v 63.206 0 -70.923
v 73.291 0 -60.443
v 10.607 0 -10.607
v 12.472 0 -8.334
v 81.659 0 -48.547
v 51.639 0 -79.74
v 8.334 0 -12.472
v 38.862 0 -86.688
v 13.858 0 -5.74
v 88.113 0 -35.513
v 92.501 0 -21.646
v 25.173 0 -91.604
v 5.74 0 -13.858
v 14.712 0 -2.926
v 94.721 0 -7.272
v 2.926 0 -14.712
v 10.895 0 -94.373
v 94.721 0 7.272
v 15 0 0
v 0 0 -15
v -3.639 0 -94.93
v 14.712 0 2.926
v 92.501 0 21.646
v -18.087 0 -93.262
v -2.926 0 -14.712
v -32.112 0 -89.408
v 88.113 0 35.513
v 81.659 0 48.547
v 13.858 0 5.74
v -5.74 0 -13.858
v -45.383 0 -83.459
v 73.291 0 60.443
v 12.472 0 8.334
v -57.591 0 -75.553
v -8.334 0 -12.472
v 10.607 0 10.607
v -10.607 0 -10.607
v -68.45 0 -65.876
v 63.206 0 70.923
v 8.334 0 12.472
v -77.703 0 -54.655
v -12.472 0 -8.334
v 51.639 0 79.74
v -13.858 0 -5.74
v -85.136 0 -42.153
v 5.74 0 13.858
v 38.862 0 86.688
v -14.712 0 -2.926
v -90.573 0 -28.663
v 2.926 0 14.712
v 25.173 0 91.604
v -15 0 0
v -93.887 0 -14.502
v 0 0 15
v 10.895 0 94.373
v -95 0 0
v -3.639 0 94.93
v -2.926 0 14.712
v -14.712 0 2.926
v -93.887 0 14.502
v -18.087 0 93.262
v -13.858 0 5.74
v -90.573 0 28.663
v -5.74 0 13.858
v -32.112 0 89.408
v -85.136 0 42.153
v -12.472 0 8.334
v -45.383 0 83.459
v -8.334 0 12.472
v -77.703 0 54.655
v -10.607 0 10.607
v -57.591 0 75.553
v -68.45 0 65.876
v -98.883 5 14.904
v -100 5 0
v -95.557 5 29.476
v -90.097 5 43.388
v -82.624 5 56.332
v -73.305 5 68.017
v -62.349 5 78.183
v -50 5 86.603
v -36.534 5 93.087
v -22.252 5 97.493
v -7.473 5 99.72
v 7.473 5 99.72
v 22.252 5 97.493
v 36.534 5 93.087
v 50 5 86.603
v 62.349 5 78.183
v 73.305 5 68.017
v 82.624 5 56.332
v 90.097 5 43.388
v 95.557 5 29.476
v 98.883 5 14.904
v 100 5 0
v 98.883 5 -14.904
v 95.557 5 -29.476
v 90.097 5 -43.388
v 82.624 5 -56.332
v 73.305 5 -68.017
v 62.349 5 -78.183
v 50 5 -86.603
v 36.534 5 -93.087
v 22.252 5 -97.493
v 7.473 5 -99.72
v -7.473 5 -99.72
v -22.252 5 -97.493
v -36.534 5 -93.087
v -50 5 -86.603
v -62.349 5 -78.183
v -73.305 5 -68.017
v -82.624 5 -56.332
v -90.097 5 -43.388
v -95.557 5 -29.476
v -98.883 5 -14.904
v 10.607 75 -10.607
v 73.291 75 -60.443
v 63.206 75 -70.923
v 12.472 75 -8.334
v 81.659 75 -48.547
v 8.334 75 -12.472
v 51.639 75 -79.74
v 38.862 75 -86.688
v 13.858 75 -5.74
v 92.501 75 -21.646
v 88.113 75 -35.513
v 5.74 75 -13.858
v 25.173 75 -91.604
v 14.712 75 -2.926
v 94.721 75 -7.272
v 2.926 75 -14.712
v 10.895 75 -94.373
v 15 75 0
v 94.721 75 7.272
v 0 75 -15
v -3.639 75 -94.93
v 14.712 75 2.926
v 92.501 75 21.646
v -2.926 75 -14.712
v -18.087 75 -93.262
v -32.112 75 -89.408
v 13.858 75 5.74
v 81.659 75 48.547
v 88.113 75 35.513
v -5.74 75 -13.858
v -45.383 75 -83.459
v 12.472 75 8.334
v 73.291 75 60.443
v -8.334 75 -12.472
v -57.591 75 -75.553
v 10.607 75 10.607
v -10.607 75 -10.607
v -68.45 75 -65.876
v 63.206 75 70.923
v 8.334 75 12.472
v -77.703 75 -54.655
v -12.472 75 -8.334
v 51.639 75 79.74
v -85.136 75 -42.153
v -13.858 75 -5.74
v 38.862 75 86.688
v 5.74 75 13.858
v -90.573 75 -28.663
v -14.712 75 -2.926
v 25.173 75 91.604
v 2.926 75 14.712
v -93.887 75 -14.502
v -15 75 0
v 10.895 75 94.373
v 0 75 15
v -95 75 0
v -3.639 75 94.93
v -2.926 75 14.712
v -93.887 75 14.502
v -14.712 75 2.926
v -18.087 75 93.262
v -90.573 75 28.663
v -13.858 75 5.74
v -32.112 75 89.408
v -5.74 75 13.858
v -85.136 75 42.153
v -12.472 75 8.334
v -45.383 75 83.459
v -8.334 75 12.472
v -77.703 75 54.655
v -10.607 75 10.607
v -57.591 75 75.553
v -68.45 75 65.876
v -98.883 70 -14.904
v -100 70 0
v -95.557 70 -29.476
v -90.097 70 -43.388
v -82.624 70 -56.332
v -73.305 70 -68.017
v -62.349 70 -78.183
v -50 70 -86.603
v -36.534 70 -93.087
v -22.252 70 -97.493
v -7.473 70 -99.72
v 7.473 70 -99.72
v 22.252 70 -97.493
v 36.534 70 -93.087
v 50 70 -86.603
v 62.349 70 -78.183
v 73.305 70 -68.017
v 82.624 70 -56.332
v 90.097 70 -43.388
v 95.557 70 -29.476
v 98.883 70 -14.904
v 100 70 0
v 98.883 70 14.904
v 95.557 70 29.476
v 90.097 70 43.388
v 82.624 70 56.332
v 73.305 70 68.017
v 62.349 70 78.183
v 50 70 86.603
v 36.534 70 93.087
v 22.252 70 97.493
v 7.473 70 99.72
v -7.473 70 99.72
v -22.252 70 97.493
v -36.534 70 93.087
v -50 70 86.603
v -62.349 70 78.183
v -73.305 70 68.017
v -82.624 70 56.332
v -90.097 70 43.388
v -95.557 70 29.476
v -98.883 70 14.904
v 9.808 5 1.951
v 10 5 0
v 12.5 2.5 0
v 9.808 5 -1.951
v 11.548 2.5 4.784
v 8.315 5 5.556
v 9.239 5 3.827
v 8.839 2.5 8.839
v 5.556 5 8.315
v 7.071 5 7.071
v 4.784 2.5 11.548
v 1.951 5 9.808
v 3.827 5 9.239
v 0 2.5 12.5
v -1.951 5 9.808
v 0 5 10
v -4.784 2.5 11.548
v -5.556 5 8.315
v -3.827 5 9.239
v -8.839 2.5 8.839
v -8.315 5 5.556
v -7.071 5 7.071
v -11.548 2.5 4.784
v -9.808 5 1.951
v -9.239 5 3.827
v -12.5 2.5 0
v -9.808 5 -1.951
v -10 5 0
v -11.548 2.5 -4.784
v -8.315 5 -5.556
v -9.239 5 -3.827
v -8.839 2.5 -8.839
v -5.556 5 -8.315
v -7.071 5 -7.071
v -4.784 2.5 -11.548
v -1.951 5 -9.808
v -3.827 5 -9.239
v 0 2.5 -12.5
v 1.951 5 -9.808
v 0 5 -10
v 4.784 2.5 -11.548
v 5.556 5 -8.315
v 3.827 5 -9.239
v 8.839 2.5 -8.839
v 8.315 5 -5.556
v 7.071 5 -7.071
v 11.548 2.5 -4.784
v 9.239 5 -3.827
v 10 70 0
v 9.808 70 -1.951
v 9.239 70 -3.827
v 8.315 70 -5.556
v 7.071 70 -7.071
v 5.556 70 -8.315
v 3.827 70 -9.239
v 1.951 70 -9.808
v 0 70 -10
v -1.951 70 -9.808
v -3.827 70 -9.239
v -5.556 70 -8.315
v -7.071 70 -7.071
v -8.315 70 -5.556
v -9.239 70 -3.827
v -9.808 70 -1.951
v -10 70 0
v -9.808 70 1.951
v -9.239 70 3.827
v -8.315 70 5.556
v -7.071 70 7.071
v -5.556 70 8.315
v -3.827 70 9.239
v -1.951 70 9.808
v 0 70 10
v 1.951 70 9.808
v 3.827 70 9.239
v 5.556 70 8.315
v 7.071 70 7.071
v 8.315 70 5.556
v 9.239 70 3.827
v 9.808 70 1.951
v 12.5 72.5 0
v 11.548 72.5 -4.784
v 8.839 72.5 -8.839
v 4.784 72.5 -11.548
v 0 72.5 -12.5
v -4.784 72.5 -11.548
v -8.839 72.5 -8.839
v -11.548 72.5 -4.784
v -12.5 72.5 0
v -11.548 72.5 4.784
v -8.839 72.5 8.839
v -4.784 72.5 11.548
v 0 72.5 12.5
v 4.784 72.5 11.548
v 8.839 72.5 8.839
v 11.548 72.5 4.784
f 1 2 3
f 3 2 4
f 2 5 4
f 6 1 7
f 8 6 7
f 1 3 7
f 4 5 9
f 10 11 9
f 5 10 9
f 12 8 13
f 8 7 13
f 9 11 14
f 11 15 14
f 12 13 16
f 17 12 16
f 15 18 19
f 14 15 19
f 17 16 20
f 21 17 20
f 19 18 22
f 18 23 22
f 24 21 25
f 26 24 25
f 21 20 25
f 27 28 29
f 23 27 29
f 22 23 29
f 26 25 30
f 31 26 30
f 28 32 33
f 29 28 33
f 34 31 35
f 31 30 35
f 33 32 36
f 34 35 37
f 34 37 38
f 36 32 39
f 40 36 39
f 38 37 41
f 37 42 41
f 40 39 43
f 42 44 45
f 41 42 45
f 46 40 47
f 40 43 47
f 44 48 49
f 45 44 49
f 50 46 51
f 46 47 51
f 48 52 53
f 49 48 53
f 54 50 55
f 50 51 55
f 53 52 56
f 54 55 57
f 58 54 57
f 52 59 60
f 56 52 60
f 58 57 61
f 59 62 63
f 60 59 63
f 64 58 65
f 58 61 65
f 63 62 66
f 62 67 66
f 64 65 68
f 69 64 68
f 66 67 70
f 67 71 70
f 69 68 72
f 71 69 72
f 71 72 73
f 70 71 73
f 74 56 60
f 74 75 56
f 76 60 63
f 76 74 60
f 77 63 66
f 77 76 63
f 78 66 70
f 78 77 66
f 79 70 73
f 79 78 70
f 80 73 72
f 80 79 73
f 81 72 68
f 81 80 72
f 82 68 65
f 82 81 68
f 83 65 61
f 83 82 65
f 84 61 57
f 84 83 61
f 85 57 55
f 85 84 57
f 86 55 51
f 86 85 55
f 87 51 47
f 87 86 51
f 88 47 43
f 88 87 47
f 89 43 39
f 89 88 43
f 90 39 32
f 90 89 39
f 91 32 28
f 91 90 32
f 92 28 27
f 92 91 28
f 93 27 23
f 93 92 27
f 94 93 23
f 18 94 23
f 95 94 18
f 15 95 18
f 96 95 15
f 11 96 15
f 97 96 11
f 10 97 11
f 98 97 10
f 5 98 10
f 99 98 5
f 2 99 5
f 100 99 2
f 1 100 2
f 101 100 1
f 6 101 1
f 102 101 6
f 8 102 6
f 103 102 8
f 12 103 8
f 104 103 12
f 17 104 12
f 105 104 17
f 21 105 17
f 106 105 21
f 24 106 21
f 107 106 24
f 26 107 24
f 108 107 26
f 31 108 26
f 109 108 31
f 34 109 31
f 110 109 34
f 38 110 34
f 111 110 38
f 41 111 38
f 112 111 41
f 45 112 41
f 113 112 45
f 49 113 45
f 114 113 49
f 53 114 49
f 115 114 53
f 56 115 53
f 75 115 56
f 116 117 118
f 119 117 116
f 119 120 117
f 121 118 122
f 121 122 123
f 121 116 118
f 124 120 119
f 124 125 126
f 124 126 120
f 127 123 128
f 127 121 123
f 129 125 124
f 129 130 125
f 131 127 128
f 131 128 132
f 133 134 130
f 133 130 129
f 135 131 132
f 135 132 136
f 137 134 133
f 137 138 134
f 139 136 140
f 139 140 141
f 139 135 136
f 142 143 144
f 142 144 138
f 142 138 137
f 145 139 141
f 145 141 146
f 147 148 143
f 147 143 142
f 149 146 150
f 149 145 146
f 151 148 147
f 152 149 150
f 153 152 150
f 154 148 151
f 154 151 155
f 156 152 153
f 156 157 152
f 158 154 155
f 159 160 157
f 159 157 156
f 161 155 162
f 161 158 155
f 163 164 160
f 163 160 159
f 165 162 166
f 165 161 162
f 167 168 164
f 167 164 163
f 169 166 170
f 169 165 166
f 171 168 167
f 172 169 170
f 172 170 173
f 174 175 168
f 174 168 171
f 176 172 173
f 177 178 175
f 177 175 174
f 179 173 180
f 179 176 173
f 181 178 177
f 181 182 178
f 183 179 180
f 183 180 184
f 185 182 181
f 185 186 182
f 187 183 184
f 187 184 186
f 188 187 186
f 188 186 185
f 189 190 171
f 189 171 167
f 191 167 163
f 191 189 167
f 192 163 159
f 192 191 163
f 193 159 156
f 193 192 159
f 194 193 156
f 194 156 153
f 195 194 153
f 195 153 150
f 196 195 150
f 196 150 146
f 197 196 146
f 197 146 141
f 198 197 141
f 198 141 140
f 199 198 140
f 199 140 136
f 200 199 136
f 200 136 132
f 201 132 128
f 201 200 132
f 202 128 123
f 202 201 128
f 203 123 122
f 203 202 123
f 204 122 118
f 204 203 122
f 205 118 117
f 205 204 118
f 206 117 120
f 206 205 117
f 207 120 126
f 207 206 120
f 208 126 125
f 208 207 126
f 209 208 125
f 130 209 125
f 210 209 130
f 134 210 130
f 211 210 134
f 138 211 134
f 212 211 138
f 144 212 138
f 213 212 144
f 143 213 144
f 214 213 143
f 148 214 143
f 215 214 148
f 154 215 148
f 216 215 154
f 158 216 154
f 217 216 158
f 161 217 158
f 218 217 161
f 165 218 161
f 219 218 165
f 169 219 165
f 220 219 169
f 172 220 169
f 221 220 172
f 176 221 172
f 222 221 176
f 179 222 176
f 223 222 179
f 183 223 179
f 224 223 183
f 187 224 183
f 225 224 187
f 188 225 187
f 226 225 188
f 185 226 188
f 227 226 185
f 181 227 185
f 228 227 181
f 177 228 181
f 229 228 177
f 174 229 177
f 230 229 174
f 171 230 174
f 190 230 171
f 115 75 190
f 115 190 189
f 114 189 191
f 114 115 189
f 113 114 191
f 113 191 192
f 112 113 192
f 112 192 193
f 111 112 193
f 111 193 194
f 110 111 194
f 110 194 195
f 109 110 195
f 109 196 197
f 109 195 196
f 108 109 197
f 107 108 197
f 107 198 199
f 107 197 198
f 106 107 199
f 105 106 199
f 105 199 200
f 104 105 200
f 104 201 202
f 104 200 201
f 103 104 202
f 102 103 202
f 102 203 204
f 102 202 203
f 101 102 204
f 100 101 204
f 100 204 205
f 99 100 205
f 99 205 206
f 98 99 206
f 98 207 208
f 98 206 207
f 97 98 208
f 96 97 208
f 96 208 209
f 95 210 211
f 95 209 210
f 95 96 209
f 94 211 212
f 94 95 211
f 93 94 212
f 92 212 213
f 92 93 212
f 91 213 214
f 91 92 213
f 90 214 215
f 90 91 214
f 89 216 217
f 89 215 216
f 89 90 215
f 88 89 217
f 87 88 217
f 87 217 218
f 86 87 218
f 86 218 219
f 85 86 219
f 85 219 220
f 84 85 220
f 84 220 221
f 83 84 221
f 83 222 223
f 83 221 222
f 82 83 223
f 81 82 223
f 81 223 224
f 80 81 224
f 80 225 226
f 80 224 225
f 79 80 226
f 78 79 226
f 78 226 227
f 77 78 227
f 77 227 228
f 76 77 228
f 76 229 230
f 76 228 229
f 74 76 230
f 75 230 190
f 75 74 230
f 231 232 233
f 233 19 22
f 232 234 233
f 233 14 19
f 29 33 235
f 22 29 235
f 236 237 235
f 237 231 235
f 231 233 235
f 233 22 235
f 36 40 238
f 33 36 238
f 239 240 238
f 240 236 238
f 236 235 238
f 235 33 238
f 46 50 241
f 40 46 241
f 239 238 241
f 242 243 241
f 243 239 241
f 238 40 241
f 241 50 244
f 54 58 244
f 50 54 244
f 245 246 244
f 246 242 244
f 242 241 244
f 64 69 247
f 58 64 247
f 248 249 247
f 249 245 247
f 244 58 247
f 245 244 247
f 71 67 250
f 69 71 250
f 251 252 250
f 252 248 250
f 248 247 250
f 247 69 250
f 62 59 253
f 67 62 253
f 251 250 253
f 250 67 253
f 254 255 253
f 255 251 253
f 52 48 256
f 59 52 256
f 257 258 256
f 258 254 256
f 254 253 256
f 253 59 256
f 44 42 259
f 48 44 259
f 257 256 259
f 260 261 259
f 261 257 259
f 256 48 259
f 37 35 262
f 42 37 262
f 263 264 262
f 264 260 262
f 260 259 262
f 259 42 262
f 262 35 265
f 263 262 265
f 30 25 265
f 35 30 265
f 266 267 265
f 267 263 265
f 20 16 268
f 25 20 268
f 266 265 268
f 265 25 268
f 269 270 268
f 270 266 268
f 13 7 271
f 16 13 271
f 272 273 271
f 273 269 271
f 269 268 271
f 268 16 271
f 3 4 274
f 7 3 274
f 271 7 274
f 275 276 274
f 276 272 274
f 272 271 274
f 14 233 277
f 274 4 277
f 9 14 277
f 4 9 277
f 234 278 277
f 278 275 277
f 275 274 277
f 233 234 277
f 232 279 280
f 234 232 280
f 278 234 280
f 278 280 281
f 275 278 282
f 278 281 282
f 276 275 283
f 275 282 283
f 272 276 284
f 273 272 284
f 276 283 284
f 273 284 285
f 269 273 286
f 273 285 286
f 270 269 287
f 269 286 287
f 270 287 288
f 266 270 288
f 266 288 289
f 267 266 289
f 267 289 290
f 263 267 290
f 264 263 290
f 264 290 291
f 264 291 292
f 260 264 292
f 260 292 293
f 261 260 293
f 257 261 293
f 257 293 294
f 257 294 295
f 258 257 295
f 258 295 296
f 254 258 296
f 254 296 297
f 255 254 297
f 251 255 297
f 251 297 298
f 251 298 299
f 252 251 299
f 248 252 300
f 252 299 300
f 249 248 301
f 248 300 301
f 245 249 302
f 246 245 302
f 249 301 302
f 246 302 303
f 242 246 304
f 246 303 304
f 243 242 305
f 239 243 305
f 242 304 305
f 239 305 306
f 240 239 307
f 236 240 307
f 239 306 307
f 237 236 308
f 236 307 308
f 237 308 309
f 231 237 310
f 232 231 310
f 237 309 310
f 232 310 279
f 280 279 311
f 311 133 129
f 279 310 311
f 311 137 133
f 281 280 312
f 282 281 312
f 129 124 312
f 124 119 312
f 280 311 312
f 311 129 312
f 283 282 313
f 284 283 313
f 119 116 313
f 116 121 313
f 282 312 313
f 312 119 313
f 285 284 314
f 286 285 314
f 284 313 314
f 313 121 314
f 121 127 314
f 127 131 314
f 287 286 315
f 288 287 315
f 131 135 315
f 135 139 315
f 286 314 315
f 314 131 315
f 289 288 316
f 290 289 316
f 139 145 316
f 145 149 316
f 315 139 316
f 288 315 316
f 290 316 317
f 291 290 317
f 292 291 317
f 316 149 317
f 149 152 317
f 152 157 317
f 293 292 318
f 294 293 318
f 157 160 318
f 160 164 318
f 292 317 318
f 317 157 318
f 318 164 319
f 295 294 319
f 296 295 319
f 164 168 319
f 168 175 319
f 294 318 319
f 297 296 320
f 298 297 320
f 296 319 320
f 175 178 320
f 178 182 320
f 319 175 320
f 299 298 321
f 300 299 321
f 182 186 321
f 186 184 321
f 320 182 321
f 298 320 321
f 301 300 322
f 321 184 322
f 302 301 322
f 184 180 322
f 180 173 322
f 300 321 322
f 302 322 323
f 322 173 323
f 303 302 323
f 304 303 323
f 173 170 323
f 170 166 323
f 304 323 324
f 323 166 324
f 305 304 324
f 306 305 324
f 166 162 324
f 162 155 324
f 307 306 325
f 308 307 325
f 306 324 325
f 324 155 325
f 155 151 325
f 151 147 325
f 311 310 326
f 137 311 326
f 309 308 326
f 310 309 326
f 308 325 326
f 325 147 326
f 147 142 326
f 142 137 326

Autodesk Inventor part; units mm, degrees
ref_plane "YZ Plane" through (0, 0, 0) normal (1, 0, 0) x (0, 1, 0)
ref_plane "XZ Plane" through (0, 0, 0) normal (0, 1, 0) x (-1, 0, 0)
ref_plane "XY Plane" through (0, 0, 0) normal (0, 0, 1) x (1, 0, 0)
sketch "Sketch1" plane through (0, 0, 0) normal (0, 1, 0) x (-1, 0, 0)
  circle A0 centre (0, 0) radius 100
  dimension "d0" = 200
extrude "Extrusion1" add sketch "Sketch1" along normal blind 75
chamfer "Chamfer1" distance 5 angle 45 2 edges at (100, 75, 0) (100, 0, 0)
sketch "Sketch2" plane through (0, 75, 0) normal (0, 1, 0) x (1, 0, 0)
  circle A0 centre (0, 0) radius 10
  dimension "d6" = 20
extrude "Extrusion2" cut sketch "Sketch2" against normal blind 75
chamfer "Chamfer2" distance 5 angle 45 2 edges at (-10, 75, 0) (-10, 0, 0)
properties part number "Peso"
